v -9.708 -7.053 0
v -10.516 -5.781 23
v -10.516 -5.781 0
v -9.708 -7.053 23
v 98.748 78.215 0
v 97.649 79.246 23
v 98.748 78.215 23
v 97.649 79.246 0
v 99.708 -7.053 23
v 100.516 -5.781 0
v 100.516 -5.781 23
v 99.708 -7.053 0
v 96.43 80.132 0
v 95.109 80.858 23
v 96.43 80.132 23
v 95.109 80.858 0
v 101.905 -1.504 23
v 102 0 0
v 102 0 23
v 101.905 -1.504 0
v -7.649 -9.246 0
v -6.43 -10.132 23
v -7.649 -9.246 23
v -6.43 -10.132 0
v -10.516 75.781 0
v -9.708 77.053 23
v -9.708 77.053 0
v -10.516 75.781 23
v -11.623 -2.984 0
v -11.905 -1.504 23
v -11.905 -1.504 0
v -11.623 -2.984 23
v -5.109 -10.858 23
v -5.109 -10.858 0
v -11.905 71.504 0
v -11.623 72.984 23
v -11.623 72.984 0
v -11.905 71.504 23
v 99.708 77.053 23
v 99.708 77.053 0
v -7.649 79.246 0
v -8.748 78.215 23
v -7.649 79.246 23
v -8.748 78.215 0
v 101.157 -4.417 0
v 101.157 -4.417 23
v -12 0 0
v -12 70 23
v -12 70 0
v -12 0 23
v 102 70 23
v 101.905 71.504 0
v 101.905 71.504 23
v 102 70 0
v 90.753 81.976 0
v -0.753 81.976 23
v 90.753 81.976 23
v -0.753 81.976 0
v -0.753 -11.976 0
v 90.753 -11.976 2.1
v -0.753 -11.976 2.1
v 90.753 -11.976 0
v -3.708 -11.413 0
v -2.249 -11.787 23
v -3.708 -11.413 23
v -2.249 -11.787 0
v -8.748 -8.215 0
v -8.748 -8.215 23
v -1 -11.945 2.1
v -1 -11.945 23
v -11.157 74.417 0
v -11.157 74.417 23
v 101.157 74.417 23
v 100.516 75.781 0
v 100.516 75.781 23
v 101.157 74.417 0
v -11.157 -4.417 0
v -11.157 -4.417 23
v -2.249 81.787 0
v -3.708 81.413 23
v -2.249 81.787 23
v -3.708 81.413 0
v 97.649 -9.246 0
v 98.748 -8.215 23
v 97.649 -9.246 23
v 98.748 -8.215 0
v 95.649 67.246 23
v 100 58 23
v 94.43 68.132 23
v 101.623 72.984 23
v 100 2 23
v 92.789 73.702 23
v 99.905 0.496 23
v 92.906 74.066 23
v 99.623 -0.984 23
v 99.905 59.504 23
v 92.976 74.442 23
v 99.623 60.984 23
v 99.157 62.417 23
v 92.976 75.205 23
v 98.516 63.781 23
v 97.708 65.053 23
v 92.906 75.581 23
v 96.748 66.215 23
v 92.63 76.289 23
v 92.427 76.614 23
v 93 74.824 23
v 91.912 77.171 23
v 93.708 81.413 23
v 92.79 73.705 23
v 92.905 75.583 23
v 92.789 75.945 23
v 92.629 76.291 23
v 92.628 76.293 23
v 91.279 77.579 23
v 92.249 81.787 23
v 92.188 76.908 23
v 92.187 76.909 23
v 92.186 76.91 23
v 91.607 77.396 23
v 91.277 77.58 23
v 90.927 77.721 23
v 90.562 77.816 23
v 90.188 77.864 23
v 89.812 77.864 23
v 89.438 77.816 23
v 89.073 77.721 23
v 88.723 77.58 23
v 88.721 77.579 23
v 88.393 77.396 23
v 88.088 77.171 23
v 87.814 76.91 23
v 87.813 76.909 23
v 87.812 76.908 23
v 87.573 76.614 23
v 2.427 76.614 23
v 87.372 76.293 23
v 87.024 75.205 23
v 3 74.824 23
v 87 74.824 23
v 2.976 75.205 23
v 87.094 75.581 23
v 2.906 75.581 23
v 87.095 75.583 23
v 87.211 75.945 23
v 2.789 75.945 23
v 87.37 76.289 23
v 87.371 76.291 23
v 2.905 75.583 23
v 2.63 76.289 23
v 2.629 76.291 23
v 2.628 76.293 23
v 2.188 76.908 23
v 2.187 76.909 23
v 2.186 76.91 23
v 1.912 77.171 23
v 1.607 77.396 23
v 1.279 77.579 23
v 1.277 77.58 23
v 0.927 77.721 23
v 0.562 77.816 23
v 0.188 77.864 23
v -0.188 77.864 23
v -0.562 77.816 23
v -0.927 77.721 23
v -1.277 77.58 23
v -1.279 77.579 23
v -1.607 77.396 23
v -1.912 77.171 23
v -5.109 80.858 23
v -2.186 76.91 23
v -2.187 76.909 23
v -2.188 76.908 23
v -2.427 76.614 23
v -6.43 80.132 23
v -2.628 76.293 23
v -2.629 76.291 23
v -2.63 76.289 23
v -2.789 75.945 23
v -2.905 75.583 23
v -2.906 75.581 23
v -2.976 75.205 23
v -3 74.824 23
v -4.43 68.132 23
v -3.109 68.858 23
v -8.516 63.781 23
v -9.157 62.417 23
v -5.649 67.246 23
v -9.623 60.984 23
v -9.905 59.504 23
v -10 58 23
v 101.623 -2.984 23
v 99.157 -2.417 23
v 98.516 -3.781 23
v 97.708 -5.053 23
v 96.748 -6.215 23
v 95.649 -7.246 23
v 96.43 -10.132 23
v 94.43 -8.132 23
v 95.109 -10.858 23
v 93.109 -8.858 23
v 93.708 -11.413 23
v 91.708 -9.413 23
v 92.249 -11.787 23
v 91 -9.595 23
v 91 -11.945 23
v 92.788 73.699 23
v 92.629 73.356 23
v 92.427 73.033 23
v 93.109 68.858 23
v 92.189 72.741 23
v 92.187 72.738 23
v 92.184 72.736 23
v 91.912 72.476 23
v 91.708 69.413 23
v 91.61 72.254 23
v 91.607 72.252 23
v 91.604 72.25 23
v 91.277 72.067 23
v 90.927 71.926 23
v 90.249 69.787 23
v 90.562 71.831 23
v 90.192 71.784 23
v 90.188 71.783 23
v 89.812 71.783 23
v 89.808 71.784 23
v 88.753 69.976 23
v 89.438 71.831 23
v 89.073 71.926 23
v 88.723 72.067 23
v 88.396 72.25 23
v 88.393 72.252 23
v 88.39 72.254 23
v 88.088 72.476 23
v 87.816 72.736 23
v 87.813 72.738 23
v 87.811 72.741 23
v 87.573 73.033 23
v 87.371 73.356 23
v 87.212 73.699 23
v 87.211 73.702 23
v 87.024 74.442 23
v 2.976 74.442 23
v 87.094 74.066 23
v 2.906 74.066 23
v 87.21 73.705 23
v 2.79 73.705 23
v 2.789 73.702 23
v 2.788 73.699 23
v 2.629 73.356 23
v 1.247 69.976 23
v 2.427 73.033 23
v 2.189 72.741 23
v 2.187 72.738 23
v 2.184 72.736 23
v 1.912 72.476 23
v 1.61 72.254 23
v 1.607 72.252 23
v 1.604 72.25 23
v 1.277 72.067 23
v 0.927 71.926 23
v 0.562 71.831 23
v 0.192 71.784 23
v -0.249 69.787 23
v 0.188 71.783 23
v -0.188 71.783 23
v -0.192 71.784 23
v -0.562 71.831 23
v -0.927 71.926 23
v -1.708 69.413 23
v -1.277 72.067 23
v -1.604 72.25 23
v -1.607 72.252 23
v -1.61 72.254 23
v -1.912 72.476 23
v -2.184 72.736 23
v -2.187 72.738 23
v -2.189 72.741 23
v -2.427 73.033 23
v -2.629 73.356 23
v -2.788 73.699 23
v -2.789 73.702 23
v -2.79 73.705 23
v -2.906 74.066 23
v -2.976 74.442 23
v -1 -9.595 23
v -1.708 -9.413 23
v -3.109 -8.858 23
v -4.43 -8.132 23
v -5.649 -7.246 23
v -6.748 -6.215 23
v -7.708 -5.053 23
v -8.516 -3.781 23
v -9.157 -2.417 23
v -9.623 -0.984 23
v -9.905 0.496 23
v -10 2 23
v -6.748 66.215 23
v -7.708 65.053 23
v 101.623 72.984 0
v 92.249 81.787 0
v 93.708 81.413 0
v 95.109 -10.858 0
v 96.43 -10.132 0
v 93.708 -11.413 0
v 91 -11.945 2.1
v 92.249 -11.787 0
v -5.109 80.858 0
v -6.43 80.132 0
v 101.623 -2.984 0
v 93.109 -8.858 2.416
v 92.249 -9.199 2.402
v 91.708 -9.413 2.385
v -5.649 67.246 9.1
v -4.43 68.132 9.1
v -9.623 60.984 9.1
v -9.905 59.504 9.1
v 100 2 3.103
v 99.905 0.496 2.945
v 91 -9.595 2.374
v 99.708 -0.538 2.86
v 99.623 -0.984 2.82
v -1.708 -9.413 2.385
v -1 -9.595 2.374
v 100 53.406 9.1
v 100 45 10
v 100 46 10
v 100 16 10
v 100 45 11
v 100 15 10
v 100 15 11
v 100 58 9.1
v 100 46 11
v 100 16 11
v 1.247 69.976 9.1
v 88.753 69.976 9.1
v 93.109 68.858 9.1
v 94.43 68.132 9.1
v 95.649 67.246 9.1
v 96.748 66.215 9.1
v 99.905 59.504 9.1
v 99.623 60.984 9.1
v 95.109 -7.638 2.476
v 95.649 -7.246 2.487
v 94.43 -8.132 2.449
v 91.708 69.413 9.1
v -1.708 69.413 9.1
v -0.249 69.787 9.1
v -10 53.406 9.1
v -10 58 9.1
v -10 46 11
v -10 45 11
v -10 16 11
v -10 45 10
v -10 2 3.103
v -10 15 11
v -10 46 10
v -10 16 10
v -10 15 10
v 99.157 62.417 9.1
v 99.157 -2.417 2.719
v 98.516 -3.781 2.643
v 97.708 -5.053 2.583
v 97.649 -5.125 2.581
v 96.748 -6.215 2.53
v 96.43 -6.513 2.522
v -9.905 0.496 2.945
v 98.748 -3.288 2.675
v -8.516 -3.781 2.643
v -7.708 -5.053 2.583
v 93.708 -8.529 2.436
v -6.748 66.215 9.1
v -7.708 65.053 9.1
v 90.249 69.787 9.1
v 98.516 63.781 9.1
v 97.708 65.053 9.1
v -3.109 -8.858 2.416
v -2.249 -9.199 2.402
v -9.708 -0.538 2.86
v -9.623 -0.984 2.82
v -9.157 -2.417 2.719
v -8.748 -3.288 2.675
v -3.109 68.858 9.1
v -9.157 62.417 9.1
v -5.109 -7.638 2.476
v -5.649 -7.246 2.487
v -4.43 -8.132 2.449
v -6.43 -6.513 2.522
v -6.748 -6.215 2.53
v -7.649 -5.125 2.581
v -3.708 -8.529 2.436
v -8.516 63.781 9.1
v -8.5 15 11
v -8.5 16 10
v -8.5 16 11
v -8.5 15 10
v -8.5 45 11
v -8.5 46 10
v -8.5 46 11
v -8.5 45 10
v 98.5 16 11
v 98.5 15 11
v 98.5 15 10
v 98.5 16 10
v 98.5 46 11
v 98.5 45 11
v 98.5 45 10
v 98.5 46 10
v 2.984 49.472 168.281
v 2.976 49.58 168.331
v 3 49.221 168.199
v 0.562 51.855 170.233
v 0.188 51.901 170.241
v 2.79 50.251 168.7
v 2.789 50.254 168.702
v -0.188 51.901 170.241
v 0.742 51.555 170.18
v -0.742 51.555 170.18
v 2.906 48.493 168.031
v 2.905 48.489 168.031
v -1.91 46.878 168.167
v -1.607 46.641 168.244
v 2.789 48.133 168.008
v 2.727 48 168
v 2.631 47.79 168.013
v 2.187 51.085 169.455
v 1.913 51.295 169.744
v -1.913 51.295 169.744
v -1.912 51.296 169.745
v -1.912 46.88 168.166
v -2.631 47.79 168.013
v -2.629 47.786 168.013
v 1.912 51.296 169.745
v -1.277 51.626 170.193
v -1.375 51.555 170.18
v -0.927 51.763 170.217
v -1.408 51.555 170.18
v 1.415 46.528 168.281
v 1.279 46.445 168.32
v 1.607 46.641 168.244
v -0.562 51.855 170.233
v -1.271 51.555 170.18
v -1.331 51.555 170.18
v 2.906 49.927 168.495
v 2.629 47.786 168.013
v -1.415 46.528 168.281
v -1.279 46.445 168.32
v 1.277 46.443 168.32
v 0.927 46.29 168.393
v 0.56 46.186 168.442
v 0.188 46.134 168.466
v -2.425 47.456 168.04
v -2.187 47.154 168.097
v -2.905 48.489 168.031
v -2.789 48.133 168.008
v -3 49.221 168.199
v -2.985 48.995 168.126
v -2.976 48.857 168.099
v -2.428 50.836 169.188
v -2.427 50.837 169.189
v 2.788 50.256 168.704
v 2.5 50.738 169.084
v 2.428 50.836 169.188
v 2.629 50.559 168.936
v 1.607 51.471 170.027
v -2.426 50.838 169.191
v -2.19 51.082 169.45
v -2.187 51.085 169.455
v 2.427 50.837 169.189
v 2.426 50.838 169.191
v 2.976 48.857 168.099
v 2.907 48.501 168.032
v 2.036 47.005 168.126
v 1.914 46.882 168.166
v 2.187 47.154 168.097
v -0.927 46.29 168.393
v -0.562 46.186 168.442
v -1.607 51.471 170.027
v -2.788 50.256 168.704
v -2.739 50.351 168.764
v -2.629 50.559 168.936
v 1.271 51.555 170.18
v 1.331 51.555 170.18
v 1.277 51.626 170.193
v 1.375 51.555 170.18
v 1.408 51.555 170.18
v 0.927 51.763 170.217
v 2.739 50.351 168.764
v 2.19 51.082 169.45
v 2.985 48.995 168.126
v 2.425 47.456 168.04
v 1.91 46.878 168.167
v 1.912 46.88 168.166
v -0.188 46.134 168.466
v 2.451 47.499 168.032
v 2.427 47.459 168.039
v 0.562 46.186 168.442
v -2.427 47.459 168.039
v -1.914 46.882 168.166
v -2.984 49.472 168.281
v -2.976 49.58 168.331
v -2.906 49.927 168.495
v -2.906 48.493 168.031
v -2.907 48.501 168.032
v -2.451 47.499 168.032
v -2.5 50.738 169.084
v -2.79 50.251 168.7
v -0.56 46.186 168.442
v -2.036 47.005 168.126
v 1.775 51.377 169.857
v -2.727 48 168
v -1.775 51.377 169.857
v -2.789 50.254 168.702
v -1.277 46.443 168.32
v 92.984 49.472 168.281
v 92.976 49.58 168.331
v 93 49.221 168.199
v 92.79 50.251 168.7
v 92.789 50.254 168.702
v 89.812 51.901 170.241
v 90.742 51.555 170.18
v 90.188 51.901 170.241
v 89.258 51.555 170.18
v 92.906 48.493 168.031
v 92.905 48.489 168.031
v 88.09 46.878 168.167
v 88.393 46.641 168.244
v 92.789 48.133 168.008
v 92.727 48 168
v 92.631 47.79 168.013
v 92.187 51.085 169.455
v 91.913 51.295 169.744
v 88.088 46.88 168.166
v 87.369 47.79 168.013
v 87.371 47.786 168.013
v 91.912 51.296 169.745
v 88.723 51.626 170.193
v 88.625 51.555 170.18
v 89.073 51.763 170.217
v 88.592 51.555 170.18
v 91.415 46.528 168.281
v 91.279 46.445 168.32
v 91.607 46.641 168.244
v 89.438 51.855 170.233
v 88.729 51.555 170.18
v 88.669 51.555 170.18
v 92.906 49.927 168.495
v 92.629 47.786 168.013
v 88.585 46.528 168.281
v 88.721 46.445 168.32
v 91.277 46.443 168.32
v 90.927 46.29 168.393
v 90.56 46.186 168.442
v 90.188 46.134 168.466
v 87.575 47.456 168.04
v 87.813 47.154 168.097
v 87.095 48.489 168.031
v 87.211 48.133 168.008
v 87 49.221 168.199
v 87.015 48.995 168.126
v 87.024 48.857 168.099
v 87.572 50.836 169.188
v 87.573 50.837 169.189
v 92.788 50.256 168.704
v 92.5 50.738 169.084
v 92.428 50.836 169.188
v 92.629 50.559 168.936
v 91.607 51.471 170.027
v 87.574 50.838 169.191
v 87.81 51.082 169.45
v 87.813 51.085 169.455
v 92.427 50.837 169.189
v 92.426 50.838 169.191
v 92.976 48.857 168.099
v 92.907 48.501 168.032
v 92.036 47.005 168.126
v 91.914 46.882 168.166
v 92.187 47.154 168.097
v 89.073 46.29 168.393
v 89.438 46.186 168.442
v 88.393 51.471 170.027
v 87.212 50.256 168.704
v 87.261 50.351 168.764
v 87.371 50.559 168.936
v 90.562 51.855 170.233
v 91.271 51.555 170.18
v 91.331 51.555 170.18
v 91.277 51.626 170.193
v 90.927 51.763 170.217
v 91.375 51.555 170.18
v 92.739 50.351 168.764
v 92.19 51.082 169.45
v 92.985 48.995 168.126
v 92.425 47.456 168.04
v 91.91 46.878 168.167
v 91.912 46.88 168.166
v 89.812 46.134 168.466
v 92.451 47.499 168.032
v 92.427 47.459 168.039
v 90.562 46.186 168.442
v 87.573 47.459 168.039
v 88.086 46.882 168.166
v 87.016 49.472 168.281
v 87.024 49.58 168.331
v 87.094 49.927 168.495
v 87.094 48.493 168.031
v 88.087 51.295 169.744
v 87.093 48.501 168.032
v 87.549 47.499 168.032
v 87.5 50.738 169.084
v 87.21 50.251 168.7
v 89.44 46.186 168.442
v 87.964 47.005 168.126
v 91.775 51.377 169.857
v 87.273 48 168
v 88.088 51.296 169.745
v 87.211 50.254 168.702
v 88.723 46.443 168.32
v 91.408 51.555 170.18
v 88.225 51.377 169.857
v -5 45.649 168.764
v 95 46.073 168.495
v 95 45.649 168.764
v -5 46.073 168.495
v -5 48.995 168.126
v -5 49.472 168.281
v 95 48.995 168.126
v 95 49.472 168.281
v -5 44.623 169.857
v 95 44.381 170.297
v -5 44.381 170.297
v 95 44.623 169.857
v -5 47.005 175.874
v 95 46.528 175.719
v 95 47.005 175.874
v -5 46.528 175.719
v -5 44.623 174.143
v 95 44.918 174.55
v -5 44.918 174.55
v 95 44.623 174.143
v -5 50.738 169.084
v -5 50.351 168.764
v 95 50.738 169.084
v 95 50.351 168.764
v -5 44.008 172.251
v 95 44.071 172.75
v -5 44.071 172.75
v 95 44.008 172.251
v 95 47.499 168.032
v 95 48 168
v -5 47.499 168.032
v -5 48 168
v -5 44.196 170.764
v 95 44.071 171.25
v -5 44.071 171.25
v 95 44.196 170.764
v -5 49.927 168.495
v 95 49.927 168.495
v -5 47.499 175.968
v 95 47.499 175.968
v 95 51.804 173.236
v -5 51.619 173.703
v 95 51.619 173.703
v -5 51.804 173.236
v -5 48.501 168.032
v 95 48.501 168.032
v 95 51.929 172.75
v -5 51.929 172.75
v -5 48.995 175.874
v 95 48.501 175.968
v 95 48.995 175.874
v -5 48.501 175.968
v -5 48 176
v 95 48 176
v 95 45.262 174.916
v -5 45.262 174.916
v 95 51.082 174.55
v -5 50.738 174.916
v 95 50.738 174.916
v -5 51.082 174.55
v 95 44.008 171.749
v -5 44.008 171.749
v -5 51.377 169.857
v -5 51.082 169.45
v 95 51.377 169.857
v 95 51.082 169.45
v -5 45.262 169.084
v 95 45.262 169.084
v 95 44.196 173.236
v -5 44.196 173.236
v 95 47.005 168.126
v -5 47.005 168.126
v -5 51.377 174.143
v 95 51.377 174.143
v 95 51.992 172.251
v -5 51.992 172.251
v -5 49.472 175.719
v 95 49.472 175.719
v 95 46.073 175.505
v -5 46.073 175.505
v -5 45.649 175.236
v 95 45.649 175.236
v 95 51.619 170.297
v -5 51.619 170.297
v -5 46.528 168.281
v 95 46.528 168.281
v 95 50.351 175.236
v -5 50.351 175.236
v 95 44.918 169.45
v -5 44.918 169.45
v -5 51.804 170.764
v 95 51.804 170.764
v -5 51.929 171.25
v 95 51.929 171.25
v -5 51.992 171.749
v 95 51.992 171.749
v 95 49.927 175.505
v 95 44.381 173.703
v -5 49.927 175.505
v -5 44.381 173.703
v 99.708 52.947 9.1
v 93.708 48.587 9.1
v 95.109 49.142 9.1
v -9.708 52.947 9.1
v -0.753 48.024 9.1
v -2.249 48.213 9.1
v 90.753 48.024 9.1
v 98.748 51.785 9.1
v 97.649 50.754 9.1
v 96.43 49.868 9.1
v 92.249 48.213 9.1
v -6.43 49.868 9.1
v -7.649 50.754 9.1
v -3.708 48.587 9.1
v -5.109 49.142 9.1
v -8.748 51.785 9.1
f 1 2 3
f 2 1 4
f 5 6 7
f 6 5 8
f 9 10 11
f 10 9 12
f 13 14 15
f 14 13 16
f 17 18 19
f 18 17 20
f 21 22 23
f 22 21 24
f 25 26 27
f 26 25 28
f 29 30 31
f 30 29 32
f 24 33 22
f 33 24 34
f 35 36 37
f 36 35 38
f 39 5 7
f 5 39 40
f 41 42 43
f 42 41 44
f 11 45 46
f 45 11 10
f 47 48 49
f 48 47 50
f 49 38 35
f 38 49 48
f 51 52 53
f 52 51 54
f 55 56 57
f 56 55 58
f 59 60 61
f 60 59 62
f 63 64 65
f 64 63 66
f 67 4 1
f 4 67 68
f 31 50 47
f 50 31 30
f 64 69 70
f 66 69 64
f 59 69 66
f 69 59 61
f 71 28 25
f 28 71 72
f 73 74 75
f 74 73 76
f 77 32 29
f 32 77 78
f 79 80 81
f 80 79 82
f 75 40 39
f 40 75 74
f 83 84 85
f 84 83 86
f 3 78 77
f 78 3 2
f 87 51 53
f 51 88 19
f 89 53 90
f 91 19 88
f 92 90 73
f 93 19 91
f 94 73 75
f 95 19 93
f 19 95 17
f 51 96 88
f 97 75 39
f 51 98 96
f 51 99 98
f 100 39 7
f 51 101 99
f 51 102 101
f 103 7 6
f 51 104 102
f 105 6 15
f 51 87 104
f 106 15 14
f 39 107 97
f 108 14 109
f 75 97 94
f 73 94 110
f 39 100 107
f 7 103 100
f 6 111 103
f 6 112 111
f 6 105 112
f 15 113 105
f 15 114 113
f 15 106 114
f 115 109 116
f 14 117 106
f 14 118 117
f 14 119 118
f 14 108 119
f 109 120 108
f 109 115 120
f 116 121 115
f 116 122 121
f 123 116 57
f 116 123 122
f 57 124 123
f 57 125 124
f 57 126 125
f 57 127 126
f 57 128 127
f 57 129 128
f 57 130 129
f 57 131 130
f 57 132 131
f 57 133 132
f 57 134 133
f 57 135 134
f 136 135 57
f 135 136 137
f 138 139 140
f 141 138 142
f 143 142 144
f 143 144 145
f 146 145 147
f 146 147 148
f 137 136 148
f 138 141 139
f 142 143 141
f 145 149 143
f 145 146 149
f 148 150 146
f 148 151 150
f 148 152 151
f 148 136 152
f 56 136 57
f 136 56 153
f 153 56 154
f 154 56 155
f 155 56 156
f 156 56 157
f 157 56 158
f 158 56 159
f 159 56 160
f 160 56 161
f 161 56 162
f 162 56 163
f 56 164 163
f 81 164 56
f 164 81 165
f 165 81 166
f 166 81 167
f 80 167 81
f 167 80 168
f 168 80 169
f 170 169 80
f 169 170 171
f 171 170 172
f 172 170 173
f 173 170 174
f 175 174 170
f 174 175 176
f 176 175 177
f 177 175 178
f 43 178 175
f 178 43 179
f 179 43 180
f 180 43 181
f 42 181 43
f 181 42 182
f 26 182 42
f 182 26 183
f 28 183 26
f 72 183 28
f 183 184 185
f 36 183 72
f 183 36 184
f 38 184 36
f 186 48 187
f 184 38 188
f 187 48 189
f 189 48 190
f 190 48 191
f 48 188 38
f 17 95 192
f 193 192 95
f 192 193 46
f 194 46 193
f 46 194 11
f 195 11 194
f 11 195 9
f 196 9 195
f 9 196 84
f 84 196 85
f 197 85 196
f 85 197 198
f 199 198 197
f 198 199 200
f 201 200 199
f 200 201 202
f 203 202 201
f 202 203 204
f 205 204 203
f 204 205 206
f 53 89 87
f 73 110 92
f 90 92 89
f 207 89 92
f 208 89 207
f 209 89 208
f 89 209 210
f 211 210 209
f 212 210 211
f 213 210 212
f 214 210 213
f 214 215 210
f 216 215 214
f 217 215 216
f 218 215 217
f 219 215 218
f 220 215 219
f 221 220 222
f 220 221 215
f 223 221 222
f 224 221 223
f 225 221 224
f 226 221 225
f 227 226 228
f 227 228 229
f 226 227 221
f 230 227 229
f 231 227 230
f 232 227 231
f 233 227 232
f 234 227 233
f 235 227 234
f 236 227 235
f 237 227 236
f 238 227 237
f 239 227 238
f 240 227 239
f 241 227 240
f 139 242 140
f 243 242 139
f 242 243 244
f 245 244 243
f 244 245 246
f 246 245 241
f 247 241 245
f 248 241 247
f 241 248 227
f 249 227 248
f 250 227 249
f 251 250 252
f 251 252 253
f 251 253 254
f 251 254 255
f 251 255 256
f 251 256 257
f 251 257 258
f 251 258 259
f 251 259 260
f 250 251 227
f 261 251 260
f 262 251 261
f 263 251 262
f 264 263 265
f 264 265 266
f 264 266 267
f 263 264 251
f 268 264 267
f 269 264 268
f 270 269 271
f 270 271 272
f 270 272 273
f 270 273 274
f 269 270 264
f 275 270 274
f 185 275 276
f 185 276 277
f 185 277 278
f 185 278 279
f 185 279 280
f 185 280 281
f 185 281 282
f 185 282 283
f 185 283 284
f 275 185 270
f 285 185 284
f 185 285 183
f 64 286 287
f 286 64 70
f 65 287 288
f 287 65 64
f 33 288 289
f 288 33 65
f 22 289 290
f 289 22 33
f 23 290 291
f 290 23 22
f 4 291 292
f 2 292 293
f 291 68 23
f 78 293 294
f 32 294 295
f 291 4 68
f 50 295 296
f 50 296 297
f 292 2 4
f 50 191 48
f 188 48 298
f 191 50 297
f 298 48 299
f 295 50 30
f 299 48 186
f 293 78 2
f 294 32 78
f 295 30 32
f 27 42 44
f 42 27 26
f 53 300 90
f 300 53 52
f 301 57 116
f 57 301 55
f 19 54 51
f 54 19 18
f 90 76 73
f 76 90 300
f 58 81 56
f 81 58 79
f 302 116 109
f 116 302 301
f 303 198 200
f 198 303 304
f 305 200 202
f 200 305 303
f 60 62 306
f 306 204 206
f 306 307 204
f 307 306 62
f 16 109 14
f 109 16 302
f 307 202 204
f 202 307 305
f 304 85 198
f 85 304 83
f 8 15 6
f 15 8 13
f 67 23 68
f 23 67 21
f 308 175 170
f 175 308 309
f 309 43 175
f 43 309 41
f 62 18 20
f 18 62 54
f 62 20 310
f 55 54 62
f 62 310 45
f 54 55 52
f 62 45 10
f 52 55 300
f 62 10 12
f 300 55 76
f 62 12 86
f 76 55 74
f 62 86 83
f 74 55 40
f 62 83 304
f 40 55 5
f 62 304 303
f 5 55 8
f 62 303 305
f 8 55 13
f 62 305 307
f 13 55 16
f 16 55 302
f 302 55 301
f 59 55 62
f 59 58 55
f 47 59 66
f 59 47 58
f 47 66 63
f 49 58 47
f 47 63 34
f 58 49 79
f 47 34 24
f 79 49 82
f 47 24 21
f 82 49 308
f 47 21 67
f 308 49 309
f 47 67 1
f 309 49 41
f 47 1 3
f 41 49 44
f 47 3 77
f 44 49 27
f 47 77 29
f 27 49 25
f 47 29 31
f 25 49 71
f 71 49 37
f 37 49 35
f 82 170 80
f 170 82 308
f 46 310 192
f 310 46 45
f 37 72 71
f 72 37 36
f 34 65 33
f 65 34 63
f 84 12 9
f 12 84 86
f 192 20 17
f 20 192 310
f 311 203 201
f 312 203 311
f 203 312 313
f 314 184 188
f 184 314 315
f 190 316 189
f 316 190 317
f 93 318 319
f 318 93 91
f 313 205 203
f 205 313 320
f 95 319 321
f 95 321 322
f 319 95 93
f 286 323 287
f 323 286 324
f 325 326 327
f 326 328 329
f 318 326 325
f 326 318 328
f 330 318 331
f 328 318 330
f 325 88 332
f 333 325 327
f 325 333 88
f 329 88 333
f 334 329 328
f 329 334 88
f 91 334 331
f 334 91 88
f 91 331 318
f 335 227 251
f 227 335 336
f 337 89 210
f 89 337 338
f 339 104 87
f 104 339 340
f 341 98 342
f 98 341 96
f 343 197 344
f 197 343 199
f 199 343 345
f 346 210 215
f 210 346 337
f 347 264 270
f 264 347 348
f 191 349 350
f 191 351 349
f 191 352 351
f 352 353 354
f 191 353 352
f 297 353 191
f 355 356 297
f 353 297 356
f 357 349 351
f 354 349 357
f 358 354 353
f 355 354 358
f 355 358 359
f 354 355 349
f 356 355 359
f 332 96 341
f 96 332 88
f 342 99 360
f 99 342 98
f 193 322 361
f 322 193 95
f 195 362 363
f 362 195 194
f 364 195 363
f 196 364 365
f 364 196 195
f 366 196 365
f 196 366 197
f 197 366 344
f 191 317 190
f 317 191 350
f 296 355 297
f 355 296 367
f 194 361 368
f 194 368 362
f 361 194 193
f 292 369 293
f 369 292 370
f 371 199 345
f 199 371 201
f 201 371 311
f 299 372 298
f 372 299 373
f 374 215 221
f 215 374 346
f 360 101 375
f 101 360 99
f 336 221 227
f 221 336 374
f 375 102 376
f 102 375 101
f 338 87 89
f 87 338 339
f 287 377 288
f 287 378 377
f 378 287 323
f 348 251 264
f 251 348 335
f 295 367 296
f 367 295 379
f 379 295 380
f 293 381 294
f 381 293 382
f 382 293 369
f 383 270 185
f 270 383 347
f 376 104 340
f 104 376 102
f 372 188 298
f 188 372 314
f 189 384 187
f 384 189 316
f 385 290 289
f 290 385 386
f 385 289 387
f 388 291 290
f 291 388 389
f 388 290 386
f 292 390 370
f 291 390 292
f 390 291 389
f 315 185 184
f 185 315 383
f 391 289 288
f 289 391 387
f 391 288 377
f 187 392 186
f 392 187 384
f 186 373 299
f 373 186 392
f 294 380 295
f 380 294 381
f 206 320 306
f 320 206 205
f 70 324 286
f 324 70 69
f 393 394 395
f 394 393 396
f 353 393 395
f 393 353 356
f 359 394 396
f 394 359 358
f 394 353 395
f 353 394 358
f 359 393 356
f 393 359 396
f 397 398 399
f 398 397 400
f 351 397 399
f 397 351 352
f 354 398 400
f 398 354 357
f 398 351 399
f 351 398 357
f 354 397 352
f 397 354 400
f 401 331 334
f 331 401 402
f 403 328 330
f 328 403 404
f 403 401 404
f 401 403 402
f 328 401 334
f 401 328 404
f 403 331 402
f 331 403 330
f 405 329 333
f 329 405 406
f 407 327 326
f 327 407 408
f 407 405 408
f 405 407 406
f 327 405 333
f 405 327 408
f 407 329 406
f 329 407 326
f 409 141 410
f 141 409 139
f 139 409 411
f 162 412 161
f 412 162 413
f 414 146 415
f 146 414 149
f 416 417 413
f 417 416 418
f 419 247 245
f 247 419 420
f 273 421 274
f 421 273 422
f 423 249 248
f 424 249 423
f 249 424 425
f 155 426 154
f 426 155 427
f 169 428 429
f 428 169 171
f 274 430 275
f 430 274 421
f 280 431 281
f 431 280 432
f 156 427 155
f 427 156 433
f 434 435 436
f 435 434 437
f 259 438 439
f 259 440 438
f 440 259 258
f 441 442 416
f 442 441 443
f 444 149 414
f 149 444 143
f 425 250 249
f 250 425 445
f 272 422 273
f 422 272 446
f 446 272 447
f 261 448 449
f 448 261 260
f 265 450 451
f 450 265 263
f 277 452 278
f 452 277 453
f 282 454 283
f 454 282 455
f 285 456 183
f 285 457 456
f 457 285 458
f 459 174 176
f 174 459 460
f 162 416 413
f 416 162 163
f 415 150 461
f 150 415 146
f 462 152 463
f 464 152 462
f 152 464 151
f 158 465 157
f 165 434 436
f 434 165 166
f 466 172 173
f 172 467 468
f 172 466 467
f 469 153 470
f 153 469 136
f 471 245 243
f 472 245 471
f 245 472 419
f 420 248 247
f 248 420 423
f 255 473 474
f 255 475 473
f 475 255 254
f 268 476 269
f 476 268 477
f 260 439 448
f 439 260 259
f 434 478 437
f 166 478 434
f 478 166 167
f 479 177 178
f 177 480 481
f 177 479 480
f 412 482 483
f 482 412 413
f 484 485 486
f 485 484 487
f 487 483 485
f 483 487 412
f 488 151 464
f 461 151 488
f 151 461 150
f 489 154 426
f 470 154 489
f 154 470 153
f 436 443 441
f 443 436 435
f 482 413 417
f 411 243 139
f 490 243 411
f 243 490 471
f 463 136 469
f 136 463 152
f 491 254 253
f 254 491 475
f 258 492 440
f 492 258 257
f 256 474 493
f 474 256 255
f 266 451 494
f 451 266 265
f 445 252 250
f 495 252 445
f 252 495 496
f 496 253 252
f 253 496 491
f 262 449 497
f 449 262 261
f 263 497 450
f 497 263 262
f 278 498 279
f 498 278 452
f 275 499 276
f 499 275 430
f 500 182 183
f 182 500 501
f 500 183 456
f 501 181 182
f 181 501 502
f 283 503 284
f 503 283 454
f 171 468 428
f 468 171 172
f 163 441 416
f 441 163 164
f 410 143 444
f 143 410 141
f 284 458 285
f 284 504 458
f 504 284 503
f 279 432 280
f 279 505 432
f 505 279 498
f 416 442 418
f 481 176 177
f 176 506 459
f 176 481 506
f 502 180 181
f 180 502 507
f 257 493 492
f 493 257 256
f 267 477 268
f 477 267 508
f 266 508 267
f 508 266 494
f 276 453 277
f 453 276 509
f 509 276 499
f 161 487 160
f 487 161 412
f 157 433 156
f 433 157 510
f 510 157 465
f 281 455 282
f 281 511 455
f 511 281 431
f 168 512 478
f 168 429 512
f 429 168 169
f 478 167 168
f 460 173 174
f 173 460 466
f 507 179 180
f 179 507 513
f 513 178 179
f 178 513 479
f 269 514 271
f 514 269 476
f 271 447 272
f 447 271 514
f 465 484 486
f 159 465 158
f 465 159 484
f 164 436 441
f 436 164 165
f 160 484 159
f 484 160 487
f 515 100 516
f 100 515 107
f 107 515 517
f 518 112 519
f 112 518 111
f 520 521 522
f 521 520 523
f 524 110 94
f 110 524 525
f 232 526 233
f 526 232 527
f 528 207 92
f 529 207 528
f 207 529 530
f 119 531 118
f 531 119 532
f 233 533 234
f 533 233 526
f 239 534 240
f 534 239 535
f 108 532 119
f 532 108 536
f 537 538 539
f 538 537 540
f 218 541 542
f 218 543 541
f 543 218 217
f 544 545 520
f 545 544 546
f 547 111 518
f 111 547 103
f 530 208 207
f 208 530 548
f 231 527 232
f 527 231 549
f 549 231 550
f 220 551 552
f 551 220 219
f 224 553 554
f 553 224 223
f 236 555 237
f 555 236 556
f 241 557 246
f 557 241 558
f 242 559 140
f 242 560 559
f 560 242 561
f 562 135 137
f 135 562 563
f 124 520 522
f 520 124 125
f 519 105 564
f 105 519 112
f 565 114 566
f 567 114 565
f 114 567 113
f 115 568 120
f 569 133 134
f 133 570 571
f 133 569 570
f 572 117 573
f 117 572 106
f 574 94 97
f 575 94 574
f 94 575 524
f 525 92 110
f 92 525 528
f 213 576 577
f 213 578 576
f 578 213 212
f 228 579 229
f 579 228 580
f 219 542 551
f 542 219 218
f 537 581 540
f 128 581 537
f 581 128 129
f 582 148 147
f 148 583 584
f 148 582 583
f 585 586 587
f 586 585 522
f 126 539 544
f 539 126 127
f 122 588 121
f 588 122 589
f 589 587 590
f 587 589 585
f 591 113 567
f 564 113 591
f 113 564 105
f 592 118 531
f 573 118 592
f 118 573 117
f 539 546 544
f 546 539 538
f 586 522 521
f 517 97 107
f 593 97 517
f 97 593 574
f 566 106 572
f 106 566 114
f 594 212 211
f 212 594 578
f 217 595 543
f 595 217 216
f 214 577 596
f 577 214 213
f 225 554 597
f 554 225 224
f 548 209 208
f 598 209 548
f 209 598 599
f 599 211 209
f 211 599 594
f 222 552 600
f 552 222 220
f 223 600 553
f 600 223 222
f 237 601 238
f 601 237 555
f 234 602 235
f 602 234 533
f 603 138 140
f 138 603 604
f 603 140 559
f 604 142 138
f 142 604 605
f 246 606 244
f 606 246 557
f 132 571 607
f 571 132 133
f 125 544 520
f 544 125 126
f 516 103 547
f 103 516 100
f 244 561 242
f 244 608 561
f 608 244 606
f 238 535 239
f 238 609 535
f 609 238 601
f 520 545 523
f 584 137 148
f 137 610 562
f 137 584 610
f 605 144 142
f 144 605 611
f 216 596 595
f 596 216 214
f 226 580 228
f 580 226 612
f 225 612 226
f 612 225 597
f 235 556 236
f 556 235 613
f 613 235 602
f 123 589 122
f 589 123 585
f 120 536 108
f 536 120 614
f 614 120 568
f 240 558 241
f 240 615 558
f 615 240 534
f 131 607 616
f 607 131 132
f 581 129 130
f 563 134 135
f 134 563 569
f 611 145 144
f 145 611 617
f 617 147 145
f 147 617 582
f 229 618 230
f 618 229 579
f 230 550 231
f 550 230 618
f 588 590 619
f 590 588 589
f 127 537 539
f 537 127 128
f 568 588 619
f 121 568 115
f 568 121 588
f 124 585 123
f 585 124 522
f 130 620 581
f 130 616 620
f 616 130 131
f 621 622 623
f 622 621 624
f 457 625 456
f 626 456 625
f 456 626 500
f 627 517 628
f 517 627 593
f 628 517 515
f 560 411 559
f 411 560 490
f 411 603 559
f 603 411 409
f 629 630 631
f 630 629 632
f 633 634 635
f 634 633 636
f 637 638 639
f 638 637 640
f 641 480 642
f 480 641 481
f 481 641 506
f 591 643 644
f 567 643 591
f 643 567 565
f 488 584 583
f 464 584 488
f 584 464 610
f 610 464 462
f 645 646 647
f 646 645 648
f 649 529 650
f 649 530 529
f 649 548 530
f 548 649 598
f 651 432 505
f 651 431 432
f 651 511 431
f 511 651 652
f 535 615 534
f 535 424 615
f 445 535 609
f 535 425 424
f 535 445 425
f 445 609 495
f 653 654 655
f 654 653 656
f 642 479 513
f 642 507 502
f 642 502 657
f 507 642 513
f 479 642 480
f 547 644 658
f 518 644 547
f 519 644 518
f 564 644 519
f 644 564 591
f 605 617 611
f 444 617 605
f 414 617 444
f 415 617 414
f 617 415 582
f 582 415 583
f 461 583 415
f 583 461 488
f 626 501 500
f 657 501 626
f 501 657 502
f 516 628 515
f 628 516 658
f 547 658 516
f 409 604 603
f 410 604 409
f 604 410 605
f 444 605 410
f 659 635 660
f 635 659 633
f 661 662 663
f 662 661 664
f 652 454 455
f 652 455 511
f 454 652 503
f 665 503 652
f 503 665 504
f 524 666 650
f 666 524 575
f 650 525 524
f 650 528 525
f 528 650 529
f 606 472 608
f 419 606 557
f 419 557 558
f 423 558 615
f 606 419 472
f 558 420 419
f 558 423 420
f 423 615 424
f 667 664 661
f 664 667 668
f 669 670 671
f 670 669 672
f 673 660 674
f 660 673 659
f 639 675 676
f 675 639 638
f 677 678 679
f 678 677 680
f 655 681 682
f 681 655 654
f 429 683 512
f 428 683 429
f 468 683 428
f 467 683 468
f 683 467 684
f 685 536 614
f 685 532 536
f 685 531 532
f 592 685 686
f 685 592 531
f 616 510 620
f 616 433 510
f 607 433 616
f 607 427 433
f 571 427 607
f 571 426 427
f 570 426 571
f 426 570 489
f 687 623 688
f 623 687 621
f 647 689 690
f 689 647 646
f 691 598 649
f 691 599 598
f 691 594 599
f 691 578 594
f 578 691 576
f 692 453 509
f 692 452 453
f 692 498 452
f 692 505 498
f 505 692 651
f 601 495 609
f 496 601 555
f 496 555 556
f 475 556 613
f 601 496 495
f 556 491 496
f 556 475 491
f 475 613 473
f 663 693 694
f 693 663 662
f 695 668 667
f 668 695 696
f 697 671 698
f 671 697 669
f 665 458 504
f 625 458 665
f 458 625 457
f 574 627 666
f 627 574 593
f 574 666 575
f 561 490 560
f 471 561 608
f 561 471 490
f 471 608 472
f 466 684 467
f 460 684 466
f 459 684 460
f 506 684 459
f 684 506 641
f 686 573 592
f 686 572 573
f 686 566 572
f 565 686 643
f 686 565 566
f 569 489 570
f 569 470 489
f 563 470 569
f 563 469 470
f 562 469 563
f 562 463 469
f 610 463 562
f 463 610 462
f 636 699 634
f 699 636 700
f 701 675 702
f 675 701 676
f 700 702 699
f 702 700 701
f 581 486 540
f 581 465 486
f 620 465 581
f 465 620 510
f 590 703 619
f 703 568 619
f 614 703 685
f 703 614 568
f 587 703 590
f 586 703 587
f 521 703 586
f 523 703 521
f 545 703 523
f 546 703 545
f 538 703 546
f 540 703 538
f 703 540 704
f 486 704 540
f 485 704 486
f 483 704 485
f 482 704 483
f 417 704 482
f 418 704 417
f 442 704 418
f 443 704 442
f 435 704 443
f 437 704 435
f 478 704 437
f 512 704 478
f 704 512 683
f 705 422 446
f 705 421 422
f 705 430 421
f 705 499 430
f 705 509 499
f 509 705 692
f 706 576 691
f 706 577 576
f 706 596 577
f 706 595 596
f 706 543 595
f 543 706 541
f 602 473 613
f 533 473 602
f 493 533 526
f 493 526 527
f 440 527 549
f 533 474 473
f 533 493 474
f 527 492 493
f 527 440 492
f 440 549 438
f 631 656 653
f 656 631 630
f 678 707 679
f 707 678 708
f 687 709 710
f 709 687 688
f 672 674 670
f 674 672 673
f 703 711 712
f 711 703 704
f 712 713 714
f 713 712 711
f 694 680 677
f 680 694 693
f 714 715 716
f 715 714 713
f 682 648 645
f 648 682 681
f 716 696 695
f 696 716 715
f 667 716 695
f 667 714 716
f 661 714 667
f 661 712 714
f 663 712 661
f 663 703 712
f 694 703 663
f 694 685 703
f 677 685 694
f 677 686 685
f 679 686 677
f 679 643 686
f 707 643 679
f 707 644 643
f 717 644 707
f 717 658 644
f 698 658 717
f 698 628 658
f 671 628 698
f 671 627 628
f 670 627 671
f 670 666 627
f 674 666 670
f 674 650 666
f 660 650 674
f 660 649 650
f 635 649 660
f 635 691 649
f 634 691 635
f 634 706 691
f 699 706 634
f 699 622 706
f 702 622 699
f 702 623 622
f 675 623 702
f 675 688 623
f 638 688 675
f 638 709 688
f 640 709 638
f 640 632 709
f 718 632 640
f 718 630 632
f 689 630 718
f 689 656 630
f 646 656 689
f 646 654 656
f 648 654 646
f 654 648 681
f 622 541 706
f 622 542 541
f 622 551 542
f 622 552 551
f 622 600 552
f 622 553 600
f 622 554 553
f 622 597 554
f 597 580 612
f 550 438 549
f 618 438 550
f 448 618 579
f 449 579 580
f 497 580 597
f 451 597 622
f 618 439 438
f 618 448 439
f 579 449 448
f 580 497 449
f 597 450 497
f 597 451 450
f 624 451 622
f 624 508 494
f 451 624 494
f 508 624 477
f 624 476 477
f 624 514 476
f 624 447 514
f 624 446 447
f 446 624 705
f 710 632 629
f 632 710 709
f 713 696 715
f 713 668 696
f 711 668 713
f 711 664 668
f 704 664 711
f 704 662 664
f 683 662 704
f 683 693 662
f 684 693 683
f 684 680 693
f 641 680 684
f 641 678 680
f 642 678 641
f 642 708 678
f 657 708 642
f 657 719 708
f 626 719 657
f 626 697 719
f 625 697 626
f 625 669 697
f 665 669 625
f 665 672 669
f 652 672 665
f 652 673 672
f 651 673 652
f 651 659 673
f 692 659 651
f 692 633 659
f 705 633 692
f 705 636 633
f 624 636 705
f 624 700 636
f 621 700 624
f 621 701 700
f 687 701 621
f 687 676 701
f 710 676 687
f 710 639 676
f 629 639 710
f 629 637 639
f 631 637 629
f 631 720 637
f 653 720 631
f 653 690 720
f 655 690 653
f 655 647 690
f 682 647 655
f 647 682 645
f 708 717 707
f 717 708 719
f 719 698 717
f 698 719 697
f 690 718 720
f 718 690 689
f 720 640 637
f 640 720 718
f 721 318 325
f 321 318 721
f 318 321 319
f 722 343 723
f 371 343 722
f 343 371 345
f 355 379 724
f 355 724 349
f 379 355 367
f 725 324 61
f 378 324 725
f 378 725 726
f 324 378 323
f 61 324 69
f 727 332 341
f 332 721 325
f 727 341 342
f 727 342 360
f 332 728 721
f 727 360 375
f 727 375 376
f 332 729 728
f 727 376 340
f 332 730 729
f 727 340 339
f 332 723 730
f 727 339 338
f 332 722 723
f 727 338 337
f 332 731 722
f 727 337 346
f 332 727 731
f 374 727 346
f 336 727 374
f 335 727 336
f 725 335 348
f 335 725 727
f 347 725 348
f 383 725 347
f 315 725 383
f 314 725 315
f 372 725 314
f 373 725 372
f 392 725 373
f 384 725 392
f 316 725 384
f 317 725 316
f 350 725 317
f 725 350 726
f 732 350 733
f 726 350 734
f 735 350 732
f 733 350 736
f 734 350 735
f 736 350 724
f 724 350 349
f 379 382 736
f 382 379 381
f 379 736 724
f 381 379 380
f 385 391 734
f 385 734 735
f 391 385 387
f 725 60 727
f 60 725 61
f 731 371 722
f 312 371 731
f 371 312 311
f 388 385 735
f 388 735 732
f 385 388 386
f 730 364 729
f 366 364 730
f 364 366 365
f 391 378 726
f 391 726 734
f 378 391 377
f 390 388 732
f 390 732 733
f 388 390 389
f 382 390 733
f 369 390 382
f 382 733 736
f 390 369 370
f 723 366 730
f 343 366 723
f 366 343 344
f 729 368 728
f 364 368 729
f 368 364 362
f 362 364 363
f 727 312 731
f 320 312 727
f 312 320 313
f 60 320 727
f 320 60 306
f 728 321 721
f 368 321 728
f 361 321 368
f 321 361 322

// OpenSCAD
$fn = 50;

// Główny obiekt z wizualizacją wycięcia
difference() {
    // Główna obudowa
    color("white")
    difference() {
        // Zewnętrzna bryła
        minkowski() {
            cube([90, 70, 22], center = false);
            cylinder(h = 1, r = 12);
        }
        
        // Wewnętrzne wycięcie
        translate([2, 2, 2])
        minkowski() {
            cube([86, 56, 50], center = false);
            cylinder(h = 1, r = 12);
        }
    }
    
    // Wycięcie od przodu (pokazane na czerwono)
    color("red", 0.5)
    translate([-1, -20, 2])
    cube([92, 21, 50]);
}

// Drugi element - listwa/próg
color("white")
translate([0, 0, 2])
minkowski() {
    rotate([90, 0, 90])
    linear_extrude(height = 90, center = false)
    polygon(points = [
        [0, 0],
        [60, 0],
        [60, 7]
    ]);
    
    cylinder(h = 0.1, r = 12);
}

// Wypustki/mocowania
color("red")
union() {
    // Lewa strona
    translate([-12, 15, 10])
    cube([3.5, 1, 1]);
    
    translate([-12, 45, 10])
    cube([3.5, 1, 1]);
    
    // Prawa strona
    translate([98.5, 15, 10])  // Poprawione przesunięcie
    cube([3.5, 1, 1]);
    
    translate([98.5, 45, 10])  // Poprawione przesunięcie
    cube([3.5, 1, 1]);
}

// Tacka/wnętrze
//difference() {
//    color("grey", 0.5)  // Zwiększona przejrzystość
//    translate([2.5, 3, 11])
//    minkowski() {
//        cube([84, 54, 2], center = false);
//        cylinder(h = 1, r = 12);
//    }
    
// Wycięcie dla tacki
//     for (i=[0:19]) {
//	   translate([-4 + (i * 5), -1, 10])
//	   minkowski() {
//		 cube([1, 62, 4], center = false);
//		 cylinder(h = 1, r = 1);
//	   }
//     }
     
     
 //    }
     
// stojak na szmatkę
color("grey")
union() {
     translate([0, 75, 22])
     rotate([10, 0, 0])
     cylinder(h=150, r=3);
     translate([90, 75, 22])
     rotate([10, 0, 0])
     cylinder(h=150, r=3);
     
     translate([-5, 48, 172])
     rotate([0, 90, 0])
     cylinder(h=100, r=4);
     
}
     
